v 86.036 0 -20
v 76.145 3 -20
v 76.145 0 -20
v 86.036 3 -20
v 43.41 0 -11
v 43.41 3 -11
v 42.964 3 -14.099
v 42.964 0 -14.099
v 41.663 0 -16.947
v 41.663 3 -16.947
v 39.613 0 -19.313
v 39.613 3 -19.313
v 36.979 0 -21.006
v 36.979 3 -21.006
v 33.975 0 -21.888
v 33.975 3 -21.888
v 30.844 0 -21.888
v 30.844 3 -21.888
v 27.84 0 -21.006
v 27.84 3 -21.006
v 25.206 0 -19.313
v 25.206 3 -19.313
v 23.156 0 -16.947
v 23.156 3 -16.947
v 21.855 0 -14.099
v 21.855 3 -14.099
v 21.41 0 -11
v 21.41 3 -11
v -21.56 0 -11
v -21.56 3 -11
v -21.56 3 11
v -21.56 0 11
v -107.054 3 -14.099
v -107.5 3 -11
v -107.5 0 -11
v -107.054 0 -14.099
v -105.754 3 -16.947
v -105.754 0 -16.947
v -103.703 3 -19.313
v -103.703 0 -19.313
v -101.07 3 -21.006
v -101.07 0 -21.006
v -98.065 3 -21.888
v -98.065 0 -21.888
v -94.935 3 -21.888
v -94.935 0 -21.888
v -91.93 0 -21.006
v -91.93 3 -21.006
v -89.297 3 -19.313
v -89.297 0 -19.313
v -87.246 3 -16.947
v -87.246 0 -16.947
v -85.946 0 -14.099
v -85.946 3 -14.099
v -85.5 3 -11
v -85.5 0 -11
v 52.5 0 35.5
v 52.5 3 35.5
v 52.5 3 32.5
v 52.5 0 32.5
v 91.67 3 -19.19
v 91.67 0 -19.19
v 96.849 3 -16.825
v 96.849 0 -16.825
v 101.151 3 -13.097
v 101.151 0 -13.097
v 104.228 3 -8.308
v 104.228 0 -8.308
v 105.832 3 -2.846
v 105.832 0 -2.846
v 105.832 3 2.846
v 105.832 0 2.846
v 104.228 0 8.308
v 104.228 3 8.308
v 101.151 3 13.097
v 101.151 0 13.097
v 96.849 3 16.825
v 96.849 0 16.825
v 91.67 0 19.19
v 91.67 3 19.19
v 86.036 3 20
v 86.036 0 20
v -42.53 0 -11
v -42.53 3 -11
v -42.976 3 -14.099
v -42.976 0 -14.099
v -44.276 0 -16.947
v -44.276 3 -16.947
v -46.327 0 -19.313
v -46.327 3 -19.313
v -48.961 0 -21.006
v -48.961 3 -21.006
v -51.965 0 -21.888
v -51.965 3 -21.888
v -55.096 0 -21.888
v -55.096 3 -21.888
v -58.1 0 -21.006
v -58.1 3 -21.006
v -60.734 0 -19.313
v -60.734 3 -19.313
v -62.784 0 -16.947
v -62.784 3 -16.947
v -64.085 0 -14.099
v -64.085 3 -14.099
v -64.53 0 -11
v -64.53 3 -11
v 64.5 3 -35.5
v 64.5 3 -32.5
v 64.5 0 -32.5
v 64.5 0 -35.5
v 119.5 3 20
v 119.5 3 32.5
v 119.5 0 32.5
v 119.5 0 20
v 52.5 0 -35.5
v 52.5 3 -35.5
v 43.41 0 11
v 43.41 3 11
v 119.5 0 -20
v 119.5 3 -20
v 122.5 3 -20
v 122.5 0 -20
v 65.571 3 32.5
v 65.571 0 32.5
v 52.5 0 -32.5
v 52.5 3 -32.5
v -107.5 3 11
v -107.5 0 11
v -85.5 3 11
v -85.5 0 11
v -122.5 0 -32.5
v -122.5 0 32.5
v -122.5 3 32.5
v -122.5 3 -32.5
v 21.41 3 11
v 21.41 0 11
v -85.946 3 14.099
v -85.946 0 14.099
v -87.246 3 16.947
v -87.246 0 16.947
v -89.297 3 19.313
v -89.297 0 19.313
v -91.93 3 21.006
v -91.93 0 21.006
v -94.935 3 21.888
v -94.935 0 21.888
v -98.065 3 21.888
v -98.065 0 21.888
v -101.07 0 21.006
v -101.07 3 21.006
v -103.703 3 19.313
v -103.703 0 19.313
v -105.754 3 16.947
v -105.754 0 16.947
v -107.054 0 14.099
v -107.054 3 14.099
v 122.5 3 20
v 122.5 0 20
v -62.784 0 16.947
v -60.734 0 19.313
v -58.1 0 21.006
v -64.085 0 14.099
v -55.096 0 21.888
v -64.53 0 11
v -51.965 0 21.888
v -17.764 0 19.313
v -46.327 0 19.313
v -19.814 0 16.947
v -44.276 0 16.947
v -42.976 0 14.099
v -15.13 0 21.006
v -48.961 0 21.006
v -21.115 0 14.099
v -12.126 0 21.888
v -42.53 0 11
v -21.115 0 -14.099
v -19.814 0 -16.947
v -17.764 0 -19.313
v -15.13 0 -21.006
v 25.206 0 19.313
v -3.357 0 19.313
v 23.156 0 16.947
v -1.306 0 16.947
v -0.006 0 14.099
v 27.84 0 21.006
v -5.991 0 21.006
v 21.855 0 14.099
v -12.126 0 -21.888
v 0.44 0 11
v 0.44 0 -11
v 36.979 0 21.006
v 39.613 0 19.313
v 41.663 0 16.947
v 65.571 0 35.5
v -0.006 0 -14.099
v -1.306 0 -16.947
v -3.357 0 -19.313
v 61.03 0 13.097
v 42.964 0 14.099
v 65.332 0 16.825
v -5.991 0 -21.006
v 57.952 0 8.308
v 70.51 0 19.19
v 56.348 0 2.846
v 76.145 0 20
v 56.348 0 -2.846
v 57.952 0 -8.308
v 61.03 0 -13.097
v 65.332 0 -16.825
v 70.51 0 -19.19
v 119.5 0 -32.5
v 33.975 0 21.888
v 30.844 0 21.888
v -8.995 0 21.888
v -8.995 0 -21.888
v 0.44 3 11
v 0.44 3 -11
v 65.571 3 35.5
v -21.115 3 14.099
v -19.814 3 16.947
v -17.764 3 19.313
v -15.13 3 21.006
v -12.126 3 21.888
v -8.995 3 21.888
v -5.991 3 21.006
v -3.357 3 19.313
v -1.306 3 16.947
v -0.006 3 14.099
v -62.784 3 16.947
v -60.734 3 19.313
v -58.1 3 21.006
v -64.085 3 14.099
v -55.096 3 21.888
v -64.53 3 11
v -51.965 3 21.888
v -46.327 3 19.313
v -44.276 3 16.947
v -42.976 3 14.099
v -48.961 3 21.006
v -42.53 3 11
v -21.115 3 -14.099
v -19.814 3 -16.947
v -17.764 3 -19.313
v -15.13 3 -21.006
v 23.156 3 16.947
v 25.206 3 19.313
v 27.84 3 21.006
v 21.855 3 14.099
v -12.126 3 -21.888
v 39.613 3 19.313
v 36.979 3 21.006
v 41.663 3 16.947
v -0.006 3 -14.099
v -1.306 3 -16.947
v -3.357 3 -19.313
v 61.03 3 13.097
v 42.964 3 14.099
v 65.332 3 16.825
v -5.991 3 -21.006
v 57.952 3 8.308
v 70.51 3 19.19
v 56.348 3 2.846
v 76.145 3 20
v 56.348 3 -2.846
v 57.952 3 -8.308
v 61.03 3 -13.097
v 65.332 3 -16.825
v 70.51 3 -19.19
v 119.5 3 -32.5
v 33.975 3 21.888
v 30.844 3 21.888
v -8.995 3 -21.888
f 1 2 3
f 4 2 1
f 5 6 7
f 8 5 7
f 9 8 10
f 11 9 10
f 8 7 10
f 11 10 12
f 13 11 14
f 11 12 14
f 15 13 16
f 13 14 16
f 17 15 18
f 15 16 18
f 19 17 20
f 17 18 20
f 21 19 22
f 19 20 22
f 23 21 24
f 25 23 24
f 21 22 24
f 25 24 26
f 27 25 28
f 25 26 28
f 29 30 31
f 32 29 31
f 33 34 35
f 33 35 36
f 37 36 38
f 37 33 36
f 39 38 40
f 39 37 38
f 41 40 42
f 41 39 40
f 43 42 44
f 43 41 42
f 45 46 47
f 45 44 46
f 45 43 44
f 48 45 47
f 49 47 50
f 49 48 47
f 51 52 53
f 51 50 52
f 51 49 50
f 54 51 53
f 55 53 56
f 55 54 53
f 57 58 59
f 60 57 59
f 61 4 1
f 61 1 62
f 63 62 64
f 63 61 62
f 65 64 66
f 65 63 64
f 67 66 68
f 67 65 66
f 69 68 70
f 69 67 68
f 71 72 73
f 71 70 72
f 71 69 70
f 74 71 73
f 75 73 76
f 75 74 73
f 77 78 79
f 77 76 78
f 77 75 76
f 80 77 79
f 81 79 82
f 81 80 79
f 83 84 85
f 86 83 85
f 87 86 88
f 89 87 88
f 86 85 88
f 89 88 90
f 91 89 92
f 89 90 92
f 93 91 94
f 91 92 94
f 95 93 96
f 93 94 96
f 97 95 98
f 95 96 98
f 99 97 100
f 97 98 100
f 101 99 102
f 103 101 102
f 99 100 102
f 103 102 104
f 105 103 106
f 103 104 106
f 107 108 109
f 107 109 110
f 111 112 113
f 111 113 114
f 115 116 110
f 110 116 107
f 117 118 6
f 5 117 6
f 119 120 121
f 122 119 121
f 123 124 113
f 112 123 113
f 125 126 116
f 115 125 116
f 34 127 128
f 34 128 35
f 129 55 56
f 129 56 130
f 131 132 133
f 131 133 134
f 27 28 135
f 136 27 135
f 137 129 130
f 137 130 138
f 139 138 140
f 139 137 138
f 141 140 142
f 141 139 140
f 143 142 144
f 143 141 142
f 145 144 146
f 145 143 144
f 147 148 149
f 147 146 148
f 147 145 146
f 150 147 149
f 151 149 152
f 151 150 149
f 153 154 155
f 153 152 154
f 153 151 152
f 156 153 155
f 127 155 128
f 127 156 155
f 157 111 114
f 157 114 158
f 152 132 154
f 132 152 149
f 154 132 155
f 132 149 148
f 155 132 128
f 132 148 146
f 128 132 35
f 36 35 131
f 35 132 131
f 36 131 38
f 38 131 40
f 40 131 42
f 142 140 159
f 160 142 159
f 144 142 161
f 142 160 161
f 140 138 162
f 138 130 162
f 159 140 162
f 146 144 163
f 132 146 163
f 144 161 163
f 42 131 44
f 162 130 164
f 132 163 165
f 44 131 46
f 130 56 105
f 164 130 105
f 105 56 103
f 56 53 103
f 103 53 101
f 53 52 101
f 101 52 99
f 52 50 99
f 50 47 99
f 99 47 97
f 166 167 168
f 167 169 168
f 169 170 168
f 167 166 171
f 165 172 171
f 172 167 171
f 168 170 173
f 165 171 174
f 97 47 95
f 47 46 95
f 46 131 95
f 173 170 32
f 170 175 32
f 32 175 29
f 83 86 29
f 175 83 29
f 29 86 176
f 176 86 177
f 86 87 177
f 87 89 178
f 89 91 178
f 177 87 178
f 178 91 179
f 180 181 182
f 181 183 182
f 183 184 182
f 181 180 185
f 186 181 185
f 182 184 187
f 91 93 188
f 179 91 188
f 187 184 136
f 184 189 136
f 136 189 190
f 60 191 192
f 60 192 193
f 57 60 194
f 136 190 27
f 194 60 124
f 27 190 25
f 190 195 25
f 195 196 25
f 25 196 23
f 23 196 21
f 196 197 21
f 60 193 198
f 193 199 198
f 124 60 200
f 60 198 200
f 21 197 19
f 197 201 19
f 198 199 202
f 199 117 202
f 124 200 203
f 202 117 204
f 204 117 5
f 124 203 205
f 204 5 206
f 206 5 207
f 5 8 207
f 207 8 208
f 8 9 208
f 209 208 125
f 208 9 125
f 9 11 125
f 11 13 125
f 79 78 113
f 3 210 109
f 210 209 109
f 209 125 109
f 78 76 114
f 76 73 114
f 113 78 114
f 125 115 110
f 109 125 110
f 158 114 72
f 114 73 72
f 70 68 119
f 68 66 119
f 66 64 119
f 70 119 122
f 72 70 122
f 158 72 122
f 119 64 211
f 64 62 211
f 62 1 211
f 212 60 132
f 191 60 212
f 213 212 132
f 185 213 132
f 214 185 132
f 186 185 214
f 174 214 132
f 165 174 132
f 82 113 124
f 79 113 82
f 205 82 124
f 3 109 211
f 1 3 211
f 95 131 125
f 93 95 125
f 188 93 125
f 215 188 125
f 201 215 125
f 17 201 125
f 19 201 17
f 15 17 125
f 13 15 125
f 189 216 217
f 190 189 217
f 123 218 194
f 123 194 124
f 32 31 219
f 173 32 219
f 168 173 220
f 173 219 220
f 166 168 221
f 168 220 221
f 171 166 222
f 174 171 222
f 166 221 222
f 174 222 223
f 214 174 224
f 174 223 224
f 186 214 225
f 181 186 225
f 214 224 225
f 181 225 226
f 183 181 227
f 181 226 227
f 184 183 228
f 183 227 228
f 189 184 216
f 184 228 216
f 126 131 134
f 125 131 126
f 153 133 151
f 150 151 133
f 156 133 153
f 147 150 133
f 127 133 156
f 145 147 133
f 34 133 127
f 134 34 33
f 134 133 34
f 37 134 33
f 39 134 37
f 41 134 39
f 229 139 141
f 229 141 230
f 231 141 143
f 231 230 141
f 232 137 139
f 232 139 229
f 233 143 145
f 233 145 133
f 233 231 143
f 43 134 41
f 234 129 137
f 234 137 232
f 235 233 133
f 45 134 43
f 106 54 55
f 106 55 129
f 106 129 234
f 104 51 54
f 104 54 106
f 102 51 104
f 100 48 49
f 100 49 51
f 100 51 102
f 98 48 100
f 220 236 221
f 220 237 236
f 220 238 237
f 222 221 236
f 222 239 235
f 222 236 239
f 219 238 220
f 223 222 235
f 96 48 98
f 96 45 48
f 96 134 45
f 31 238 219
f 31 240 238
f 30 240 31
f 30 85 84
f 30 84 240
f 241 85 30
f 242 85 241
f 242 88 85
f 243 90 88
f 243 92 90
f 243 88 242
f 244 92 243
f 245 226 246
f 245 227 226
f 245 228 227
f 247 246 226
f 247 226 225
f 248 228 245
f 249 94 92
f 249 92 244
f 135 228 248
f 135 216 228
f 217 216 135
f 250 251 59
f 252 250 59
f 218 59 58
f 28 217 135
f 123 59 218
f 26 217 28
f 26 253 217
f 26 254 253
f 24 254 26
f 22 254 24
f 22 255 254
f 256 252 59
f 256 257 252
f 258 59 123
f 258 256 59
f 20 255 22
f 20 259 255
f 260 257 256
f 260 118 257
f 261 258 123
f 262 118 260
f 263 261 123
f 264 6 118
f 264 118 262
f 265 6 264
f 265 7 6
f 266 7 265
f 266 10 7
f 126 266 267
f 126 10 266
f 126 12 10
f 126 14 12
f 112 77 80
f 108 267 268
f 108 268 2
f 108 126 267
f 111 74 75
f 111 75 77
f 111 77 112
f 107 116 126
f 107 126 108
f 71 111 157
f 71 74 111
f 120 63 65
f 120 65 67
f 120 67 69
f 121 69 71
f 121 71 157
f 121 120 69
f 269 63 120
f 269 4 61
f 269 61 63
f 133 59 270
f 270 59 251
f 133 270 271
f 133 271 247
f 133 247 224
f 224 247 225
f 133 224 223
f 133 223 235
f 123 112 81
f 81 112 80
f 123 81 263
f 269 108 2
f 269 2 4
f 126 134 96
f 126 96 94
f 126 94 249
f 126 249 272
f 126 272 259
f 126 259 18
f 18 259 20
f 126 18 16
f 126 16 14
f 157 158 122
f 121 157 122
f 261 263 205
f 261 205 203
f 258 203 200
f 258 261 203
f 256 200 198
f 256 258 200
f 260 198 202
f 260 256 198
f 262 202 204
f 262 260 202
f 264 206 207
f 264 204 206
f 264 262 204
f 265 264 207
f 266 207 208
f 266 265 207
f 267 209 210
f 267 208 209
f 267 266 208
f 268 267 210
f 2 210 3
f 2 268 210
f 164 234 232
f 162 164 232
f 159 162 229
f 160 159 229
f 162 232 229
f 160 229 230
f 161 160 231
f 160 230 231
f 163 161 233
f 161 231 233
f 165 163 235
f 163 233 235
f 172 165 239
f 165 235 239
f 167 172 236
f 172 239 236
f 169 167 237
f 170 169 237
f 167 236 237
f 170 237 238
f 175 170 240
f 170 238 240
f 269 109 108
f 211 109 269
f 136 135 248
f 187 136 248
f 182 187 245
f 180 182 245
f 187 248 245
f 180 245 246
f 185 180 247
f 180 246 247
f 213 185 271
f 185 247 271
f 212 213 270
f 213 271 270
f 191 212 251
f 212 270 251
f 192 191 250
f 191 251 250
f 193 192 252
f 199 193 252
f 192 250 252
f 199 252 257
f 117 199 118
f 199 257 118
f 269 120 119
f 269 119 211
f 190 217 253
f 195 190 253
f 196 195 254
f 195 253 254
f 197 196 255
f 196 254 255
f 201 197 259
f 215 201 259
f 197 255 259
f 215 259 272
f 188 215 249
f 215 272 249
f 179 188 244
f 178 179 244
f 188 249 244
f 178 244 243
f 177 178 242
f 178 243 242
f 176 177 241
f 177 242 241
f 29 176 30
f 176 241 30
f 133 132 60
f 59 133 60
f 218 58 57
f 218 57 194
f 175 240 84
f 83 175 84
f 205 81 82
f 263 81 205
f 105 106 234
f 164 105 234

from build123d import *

# Parameters (mm, degrees)
SKETCH1_W           = 245
SKETCH1_H           = 65
BOSS_EXTRUDE1_DEPTH = 3
CUT_EXTRUDE1_DEPTH  = 10
SKETCH3_W           = 3
SKETCH3_H           = 12.5
CUT_EXTRUDE2_DEPTH  = 10
SKETCH5_W           = 12
SKETCH5_H           = 3
SKETCH5_W_2         = 13.071416553
BOSS_EXTRUDE2_DEPTH = 3


with BuildPart() as part:
    # Sketch1 → Boss-Extrude1 (new body)
    with BuildSketch(Plane(origin=(0, 0, 0), x_dir=(1, 0, 0), z_dir=(0, 1, 0))):
        Rectangle(SKETCH1_W, SKETCH1_H)
    extrude(amount=BOSS_EXTRUDE1_DEPTH)

    # Sketch2 → Cut-Extrude1 (cut)
    with BuildSketch(Plane(origin=(0, 3, 0), x_dir=(1, 0, 0), z_dir=(0, 1, 0))):
        with BuildLine():
            Line((-85.5, 11), (-85.5, -11))
            ThreePointArc((-85.5, -11), (-96.5, -22), (-107.5, -11))
            Line((-107.5, -11), (-107.5, 11))
            ThreePointArc((-107.5, 11), (-96.5, 22), (-85.5, 11))
        make_face()
        with BuildLine():
            Line((86.035837844, -20), (76.144700887, -20))
            ThreePointArc((76.144700887, -20), (56.144700887, 0), (76.144700887, 20))
            Line((76.144700887, 20), (86.035837844, 20))
            ThreePointArc((86.035837844, 20), (106.035837844, 0), (86.035837844, -20))
        make_face()
        with BuildLine():
            Line((-64.530127929, 11), (-64.530127929, -11))
            ThreePointArc((-64.530127929, -11), (-53.530127929, -22), (-42.530127929, -11))
            Line((-42.530127929, -11), (-42.530127929, 11))
            ThreePointArc((-42.530127929, 11), (-53.530127929, 22), (-64.530127929, 11))
        make_face()
        with BuildLine():
            Line((-21.560255858, 11), (-21.560255858, -11))
            ThreePointArc((-21.560255858, -11), (-10.560255858, -22), (0.439744142, -11))
            Line((0.439744142, -11), (0.439744142, 11))
            ThreePointArc((0.439744142, 11), (-10.560255858, 22), (-21.560255858, 11))
        make_face()
        with BuildLine():
            Line((21.409616214, 11), (21.409616214, -11))
            ThreePointArc((21.409616214, -11), (32.409616214, -22), (43.409616214, -11))
            Line((43.409616214, -11), (43.409616214, 11))
            ThreePointArc((43.409616214, 11), (32.409616214, 22), (21.409616214, 11))
        make_face()
    extrude(amount=-CUT_EXTRUDE1_DEPTH, mode=Mode.SUBTRACT)

    # Sketch3 → Cut-Extrude2 (cut)
    with BuildSketch(Plane(origin=(0, 3, 0), x_dir=(1, 0, 0), z_dir=(0, 1, 0))):
        with Locations((121, 26.25)):
            Rectangle(SKETCH3_W, SKETCH3_H)
        with Locations((121, -26.25)):
            Rectangle(SKETCH3_W, SKETCH3_H)
    extrude(amount=-CUT_EXTRUDE2_DEPTH, mode=Mode.SUBTRACT)

    # Sketch5 → Boss-Extrude2 (add)
    with BuildSketch(Plane(origin=(0, 3, 0), x_dir=(1, 0, 0), z_dir=(0, 1, 0))):
        with Locations((58.5, 34)):
            Rectangle(SKETCH5_W, SKETCH5_H)
        with Locations((59.035708277, -34)):
            Rectangle(SKETCH5_W_2, SKETCH5_H)
    extrude(amount=-BOSS_EXTRUDE2_DEPTH)


solid = part.part
